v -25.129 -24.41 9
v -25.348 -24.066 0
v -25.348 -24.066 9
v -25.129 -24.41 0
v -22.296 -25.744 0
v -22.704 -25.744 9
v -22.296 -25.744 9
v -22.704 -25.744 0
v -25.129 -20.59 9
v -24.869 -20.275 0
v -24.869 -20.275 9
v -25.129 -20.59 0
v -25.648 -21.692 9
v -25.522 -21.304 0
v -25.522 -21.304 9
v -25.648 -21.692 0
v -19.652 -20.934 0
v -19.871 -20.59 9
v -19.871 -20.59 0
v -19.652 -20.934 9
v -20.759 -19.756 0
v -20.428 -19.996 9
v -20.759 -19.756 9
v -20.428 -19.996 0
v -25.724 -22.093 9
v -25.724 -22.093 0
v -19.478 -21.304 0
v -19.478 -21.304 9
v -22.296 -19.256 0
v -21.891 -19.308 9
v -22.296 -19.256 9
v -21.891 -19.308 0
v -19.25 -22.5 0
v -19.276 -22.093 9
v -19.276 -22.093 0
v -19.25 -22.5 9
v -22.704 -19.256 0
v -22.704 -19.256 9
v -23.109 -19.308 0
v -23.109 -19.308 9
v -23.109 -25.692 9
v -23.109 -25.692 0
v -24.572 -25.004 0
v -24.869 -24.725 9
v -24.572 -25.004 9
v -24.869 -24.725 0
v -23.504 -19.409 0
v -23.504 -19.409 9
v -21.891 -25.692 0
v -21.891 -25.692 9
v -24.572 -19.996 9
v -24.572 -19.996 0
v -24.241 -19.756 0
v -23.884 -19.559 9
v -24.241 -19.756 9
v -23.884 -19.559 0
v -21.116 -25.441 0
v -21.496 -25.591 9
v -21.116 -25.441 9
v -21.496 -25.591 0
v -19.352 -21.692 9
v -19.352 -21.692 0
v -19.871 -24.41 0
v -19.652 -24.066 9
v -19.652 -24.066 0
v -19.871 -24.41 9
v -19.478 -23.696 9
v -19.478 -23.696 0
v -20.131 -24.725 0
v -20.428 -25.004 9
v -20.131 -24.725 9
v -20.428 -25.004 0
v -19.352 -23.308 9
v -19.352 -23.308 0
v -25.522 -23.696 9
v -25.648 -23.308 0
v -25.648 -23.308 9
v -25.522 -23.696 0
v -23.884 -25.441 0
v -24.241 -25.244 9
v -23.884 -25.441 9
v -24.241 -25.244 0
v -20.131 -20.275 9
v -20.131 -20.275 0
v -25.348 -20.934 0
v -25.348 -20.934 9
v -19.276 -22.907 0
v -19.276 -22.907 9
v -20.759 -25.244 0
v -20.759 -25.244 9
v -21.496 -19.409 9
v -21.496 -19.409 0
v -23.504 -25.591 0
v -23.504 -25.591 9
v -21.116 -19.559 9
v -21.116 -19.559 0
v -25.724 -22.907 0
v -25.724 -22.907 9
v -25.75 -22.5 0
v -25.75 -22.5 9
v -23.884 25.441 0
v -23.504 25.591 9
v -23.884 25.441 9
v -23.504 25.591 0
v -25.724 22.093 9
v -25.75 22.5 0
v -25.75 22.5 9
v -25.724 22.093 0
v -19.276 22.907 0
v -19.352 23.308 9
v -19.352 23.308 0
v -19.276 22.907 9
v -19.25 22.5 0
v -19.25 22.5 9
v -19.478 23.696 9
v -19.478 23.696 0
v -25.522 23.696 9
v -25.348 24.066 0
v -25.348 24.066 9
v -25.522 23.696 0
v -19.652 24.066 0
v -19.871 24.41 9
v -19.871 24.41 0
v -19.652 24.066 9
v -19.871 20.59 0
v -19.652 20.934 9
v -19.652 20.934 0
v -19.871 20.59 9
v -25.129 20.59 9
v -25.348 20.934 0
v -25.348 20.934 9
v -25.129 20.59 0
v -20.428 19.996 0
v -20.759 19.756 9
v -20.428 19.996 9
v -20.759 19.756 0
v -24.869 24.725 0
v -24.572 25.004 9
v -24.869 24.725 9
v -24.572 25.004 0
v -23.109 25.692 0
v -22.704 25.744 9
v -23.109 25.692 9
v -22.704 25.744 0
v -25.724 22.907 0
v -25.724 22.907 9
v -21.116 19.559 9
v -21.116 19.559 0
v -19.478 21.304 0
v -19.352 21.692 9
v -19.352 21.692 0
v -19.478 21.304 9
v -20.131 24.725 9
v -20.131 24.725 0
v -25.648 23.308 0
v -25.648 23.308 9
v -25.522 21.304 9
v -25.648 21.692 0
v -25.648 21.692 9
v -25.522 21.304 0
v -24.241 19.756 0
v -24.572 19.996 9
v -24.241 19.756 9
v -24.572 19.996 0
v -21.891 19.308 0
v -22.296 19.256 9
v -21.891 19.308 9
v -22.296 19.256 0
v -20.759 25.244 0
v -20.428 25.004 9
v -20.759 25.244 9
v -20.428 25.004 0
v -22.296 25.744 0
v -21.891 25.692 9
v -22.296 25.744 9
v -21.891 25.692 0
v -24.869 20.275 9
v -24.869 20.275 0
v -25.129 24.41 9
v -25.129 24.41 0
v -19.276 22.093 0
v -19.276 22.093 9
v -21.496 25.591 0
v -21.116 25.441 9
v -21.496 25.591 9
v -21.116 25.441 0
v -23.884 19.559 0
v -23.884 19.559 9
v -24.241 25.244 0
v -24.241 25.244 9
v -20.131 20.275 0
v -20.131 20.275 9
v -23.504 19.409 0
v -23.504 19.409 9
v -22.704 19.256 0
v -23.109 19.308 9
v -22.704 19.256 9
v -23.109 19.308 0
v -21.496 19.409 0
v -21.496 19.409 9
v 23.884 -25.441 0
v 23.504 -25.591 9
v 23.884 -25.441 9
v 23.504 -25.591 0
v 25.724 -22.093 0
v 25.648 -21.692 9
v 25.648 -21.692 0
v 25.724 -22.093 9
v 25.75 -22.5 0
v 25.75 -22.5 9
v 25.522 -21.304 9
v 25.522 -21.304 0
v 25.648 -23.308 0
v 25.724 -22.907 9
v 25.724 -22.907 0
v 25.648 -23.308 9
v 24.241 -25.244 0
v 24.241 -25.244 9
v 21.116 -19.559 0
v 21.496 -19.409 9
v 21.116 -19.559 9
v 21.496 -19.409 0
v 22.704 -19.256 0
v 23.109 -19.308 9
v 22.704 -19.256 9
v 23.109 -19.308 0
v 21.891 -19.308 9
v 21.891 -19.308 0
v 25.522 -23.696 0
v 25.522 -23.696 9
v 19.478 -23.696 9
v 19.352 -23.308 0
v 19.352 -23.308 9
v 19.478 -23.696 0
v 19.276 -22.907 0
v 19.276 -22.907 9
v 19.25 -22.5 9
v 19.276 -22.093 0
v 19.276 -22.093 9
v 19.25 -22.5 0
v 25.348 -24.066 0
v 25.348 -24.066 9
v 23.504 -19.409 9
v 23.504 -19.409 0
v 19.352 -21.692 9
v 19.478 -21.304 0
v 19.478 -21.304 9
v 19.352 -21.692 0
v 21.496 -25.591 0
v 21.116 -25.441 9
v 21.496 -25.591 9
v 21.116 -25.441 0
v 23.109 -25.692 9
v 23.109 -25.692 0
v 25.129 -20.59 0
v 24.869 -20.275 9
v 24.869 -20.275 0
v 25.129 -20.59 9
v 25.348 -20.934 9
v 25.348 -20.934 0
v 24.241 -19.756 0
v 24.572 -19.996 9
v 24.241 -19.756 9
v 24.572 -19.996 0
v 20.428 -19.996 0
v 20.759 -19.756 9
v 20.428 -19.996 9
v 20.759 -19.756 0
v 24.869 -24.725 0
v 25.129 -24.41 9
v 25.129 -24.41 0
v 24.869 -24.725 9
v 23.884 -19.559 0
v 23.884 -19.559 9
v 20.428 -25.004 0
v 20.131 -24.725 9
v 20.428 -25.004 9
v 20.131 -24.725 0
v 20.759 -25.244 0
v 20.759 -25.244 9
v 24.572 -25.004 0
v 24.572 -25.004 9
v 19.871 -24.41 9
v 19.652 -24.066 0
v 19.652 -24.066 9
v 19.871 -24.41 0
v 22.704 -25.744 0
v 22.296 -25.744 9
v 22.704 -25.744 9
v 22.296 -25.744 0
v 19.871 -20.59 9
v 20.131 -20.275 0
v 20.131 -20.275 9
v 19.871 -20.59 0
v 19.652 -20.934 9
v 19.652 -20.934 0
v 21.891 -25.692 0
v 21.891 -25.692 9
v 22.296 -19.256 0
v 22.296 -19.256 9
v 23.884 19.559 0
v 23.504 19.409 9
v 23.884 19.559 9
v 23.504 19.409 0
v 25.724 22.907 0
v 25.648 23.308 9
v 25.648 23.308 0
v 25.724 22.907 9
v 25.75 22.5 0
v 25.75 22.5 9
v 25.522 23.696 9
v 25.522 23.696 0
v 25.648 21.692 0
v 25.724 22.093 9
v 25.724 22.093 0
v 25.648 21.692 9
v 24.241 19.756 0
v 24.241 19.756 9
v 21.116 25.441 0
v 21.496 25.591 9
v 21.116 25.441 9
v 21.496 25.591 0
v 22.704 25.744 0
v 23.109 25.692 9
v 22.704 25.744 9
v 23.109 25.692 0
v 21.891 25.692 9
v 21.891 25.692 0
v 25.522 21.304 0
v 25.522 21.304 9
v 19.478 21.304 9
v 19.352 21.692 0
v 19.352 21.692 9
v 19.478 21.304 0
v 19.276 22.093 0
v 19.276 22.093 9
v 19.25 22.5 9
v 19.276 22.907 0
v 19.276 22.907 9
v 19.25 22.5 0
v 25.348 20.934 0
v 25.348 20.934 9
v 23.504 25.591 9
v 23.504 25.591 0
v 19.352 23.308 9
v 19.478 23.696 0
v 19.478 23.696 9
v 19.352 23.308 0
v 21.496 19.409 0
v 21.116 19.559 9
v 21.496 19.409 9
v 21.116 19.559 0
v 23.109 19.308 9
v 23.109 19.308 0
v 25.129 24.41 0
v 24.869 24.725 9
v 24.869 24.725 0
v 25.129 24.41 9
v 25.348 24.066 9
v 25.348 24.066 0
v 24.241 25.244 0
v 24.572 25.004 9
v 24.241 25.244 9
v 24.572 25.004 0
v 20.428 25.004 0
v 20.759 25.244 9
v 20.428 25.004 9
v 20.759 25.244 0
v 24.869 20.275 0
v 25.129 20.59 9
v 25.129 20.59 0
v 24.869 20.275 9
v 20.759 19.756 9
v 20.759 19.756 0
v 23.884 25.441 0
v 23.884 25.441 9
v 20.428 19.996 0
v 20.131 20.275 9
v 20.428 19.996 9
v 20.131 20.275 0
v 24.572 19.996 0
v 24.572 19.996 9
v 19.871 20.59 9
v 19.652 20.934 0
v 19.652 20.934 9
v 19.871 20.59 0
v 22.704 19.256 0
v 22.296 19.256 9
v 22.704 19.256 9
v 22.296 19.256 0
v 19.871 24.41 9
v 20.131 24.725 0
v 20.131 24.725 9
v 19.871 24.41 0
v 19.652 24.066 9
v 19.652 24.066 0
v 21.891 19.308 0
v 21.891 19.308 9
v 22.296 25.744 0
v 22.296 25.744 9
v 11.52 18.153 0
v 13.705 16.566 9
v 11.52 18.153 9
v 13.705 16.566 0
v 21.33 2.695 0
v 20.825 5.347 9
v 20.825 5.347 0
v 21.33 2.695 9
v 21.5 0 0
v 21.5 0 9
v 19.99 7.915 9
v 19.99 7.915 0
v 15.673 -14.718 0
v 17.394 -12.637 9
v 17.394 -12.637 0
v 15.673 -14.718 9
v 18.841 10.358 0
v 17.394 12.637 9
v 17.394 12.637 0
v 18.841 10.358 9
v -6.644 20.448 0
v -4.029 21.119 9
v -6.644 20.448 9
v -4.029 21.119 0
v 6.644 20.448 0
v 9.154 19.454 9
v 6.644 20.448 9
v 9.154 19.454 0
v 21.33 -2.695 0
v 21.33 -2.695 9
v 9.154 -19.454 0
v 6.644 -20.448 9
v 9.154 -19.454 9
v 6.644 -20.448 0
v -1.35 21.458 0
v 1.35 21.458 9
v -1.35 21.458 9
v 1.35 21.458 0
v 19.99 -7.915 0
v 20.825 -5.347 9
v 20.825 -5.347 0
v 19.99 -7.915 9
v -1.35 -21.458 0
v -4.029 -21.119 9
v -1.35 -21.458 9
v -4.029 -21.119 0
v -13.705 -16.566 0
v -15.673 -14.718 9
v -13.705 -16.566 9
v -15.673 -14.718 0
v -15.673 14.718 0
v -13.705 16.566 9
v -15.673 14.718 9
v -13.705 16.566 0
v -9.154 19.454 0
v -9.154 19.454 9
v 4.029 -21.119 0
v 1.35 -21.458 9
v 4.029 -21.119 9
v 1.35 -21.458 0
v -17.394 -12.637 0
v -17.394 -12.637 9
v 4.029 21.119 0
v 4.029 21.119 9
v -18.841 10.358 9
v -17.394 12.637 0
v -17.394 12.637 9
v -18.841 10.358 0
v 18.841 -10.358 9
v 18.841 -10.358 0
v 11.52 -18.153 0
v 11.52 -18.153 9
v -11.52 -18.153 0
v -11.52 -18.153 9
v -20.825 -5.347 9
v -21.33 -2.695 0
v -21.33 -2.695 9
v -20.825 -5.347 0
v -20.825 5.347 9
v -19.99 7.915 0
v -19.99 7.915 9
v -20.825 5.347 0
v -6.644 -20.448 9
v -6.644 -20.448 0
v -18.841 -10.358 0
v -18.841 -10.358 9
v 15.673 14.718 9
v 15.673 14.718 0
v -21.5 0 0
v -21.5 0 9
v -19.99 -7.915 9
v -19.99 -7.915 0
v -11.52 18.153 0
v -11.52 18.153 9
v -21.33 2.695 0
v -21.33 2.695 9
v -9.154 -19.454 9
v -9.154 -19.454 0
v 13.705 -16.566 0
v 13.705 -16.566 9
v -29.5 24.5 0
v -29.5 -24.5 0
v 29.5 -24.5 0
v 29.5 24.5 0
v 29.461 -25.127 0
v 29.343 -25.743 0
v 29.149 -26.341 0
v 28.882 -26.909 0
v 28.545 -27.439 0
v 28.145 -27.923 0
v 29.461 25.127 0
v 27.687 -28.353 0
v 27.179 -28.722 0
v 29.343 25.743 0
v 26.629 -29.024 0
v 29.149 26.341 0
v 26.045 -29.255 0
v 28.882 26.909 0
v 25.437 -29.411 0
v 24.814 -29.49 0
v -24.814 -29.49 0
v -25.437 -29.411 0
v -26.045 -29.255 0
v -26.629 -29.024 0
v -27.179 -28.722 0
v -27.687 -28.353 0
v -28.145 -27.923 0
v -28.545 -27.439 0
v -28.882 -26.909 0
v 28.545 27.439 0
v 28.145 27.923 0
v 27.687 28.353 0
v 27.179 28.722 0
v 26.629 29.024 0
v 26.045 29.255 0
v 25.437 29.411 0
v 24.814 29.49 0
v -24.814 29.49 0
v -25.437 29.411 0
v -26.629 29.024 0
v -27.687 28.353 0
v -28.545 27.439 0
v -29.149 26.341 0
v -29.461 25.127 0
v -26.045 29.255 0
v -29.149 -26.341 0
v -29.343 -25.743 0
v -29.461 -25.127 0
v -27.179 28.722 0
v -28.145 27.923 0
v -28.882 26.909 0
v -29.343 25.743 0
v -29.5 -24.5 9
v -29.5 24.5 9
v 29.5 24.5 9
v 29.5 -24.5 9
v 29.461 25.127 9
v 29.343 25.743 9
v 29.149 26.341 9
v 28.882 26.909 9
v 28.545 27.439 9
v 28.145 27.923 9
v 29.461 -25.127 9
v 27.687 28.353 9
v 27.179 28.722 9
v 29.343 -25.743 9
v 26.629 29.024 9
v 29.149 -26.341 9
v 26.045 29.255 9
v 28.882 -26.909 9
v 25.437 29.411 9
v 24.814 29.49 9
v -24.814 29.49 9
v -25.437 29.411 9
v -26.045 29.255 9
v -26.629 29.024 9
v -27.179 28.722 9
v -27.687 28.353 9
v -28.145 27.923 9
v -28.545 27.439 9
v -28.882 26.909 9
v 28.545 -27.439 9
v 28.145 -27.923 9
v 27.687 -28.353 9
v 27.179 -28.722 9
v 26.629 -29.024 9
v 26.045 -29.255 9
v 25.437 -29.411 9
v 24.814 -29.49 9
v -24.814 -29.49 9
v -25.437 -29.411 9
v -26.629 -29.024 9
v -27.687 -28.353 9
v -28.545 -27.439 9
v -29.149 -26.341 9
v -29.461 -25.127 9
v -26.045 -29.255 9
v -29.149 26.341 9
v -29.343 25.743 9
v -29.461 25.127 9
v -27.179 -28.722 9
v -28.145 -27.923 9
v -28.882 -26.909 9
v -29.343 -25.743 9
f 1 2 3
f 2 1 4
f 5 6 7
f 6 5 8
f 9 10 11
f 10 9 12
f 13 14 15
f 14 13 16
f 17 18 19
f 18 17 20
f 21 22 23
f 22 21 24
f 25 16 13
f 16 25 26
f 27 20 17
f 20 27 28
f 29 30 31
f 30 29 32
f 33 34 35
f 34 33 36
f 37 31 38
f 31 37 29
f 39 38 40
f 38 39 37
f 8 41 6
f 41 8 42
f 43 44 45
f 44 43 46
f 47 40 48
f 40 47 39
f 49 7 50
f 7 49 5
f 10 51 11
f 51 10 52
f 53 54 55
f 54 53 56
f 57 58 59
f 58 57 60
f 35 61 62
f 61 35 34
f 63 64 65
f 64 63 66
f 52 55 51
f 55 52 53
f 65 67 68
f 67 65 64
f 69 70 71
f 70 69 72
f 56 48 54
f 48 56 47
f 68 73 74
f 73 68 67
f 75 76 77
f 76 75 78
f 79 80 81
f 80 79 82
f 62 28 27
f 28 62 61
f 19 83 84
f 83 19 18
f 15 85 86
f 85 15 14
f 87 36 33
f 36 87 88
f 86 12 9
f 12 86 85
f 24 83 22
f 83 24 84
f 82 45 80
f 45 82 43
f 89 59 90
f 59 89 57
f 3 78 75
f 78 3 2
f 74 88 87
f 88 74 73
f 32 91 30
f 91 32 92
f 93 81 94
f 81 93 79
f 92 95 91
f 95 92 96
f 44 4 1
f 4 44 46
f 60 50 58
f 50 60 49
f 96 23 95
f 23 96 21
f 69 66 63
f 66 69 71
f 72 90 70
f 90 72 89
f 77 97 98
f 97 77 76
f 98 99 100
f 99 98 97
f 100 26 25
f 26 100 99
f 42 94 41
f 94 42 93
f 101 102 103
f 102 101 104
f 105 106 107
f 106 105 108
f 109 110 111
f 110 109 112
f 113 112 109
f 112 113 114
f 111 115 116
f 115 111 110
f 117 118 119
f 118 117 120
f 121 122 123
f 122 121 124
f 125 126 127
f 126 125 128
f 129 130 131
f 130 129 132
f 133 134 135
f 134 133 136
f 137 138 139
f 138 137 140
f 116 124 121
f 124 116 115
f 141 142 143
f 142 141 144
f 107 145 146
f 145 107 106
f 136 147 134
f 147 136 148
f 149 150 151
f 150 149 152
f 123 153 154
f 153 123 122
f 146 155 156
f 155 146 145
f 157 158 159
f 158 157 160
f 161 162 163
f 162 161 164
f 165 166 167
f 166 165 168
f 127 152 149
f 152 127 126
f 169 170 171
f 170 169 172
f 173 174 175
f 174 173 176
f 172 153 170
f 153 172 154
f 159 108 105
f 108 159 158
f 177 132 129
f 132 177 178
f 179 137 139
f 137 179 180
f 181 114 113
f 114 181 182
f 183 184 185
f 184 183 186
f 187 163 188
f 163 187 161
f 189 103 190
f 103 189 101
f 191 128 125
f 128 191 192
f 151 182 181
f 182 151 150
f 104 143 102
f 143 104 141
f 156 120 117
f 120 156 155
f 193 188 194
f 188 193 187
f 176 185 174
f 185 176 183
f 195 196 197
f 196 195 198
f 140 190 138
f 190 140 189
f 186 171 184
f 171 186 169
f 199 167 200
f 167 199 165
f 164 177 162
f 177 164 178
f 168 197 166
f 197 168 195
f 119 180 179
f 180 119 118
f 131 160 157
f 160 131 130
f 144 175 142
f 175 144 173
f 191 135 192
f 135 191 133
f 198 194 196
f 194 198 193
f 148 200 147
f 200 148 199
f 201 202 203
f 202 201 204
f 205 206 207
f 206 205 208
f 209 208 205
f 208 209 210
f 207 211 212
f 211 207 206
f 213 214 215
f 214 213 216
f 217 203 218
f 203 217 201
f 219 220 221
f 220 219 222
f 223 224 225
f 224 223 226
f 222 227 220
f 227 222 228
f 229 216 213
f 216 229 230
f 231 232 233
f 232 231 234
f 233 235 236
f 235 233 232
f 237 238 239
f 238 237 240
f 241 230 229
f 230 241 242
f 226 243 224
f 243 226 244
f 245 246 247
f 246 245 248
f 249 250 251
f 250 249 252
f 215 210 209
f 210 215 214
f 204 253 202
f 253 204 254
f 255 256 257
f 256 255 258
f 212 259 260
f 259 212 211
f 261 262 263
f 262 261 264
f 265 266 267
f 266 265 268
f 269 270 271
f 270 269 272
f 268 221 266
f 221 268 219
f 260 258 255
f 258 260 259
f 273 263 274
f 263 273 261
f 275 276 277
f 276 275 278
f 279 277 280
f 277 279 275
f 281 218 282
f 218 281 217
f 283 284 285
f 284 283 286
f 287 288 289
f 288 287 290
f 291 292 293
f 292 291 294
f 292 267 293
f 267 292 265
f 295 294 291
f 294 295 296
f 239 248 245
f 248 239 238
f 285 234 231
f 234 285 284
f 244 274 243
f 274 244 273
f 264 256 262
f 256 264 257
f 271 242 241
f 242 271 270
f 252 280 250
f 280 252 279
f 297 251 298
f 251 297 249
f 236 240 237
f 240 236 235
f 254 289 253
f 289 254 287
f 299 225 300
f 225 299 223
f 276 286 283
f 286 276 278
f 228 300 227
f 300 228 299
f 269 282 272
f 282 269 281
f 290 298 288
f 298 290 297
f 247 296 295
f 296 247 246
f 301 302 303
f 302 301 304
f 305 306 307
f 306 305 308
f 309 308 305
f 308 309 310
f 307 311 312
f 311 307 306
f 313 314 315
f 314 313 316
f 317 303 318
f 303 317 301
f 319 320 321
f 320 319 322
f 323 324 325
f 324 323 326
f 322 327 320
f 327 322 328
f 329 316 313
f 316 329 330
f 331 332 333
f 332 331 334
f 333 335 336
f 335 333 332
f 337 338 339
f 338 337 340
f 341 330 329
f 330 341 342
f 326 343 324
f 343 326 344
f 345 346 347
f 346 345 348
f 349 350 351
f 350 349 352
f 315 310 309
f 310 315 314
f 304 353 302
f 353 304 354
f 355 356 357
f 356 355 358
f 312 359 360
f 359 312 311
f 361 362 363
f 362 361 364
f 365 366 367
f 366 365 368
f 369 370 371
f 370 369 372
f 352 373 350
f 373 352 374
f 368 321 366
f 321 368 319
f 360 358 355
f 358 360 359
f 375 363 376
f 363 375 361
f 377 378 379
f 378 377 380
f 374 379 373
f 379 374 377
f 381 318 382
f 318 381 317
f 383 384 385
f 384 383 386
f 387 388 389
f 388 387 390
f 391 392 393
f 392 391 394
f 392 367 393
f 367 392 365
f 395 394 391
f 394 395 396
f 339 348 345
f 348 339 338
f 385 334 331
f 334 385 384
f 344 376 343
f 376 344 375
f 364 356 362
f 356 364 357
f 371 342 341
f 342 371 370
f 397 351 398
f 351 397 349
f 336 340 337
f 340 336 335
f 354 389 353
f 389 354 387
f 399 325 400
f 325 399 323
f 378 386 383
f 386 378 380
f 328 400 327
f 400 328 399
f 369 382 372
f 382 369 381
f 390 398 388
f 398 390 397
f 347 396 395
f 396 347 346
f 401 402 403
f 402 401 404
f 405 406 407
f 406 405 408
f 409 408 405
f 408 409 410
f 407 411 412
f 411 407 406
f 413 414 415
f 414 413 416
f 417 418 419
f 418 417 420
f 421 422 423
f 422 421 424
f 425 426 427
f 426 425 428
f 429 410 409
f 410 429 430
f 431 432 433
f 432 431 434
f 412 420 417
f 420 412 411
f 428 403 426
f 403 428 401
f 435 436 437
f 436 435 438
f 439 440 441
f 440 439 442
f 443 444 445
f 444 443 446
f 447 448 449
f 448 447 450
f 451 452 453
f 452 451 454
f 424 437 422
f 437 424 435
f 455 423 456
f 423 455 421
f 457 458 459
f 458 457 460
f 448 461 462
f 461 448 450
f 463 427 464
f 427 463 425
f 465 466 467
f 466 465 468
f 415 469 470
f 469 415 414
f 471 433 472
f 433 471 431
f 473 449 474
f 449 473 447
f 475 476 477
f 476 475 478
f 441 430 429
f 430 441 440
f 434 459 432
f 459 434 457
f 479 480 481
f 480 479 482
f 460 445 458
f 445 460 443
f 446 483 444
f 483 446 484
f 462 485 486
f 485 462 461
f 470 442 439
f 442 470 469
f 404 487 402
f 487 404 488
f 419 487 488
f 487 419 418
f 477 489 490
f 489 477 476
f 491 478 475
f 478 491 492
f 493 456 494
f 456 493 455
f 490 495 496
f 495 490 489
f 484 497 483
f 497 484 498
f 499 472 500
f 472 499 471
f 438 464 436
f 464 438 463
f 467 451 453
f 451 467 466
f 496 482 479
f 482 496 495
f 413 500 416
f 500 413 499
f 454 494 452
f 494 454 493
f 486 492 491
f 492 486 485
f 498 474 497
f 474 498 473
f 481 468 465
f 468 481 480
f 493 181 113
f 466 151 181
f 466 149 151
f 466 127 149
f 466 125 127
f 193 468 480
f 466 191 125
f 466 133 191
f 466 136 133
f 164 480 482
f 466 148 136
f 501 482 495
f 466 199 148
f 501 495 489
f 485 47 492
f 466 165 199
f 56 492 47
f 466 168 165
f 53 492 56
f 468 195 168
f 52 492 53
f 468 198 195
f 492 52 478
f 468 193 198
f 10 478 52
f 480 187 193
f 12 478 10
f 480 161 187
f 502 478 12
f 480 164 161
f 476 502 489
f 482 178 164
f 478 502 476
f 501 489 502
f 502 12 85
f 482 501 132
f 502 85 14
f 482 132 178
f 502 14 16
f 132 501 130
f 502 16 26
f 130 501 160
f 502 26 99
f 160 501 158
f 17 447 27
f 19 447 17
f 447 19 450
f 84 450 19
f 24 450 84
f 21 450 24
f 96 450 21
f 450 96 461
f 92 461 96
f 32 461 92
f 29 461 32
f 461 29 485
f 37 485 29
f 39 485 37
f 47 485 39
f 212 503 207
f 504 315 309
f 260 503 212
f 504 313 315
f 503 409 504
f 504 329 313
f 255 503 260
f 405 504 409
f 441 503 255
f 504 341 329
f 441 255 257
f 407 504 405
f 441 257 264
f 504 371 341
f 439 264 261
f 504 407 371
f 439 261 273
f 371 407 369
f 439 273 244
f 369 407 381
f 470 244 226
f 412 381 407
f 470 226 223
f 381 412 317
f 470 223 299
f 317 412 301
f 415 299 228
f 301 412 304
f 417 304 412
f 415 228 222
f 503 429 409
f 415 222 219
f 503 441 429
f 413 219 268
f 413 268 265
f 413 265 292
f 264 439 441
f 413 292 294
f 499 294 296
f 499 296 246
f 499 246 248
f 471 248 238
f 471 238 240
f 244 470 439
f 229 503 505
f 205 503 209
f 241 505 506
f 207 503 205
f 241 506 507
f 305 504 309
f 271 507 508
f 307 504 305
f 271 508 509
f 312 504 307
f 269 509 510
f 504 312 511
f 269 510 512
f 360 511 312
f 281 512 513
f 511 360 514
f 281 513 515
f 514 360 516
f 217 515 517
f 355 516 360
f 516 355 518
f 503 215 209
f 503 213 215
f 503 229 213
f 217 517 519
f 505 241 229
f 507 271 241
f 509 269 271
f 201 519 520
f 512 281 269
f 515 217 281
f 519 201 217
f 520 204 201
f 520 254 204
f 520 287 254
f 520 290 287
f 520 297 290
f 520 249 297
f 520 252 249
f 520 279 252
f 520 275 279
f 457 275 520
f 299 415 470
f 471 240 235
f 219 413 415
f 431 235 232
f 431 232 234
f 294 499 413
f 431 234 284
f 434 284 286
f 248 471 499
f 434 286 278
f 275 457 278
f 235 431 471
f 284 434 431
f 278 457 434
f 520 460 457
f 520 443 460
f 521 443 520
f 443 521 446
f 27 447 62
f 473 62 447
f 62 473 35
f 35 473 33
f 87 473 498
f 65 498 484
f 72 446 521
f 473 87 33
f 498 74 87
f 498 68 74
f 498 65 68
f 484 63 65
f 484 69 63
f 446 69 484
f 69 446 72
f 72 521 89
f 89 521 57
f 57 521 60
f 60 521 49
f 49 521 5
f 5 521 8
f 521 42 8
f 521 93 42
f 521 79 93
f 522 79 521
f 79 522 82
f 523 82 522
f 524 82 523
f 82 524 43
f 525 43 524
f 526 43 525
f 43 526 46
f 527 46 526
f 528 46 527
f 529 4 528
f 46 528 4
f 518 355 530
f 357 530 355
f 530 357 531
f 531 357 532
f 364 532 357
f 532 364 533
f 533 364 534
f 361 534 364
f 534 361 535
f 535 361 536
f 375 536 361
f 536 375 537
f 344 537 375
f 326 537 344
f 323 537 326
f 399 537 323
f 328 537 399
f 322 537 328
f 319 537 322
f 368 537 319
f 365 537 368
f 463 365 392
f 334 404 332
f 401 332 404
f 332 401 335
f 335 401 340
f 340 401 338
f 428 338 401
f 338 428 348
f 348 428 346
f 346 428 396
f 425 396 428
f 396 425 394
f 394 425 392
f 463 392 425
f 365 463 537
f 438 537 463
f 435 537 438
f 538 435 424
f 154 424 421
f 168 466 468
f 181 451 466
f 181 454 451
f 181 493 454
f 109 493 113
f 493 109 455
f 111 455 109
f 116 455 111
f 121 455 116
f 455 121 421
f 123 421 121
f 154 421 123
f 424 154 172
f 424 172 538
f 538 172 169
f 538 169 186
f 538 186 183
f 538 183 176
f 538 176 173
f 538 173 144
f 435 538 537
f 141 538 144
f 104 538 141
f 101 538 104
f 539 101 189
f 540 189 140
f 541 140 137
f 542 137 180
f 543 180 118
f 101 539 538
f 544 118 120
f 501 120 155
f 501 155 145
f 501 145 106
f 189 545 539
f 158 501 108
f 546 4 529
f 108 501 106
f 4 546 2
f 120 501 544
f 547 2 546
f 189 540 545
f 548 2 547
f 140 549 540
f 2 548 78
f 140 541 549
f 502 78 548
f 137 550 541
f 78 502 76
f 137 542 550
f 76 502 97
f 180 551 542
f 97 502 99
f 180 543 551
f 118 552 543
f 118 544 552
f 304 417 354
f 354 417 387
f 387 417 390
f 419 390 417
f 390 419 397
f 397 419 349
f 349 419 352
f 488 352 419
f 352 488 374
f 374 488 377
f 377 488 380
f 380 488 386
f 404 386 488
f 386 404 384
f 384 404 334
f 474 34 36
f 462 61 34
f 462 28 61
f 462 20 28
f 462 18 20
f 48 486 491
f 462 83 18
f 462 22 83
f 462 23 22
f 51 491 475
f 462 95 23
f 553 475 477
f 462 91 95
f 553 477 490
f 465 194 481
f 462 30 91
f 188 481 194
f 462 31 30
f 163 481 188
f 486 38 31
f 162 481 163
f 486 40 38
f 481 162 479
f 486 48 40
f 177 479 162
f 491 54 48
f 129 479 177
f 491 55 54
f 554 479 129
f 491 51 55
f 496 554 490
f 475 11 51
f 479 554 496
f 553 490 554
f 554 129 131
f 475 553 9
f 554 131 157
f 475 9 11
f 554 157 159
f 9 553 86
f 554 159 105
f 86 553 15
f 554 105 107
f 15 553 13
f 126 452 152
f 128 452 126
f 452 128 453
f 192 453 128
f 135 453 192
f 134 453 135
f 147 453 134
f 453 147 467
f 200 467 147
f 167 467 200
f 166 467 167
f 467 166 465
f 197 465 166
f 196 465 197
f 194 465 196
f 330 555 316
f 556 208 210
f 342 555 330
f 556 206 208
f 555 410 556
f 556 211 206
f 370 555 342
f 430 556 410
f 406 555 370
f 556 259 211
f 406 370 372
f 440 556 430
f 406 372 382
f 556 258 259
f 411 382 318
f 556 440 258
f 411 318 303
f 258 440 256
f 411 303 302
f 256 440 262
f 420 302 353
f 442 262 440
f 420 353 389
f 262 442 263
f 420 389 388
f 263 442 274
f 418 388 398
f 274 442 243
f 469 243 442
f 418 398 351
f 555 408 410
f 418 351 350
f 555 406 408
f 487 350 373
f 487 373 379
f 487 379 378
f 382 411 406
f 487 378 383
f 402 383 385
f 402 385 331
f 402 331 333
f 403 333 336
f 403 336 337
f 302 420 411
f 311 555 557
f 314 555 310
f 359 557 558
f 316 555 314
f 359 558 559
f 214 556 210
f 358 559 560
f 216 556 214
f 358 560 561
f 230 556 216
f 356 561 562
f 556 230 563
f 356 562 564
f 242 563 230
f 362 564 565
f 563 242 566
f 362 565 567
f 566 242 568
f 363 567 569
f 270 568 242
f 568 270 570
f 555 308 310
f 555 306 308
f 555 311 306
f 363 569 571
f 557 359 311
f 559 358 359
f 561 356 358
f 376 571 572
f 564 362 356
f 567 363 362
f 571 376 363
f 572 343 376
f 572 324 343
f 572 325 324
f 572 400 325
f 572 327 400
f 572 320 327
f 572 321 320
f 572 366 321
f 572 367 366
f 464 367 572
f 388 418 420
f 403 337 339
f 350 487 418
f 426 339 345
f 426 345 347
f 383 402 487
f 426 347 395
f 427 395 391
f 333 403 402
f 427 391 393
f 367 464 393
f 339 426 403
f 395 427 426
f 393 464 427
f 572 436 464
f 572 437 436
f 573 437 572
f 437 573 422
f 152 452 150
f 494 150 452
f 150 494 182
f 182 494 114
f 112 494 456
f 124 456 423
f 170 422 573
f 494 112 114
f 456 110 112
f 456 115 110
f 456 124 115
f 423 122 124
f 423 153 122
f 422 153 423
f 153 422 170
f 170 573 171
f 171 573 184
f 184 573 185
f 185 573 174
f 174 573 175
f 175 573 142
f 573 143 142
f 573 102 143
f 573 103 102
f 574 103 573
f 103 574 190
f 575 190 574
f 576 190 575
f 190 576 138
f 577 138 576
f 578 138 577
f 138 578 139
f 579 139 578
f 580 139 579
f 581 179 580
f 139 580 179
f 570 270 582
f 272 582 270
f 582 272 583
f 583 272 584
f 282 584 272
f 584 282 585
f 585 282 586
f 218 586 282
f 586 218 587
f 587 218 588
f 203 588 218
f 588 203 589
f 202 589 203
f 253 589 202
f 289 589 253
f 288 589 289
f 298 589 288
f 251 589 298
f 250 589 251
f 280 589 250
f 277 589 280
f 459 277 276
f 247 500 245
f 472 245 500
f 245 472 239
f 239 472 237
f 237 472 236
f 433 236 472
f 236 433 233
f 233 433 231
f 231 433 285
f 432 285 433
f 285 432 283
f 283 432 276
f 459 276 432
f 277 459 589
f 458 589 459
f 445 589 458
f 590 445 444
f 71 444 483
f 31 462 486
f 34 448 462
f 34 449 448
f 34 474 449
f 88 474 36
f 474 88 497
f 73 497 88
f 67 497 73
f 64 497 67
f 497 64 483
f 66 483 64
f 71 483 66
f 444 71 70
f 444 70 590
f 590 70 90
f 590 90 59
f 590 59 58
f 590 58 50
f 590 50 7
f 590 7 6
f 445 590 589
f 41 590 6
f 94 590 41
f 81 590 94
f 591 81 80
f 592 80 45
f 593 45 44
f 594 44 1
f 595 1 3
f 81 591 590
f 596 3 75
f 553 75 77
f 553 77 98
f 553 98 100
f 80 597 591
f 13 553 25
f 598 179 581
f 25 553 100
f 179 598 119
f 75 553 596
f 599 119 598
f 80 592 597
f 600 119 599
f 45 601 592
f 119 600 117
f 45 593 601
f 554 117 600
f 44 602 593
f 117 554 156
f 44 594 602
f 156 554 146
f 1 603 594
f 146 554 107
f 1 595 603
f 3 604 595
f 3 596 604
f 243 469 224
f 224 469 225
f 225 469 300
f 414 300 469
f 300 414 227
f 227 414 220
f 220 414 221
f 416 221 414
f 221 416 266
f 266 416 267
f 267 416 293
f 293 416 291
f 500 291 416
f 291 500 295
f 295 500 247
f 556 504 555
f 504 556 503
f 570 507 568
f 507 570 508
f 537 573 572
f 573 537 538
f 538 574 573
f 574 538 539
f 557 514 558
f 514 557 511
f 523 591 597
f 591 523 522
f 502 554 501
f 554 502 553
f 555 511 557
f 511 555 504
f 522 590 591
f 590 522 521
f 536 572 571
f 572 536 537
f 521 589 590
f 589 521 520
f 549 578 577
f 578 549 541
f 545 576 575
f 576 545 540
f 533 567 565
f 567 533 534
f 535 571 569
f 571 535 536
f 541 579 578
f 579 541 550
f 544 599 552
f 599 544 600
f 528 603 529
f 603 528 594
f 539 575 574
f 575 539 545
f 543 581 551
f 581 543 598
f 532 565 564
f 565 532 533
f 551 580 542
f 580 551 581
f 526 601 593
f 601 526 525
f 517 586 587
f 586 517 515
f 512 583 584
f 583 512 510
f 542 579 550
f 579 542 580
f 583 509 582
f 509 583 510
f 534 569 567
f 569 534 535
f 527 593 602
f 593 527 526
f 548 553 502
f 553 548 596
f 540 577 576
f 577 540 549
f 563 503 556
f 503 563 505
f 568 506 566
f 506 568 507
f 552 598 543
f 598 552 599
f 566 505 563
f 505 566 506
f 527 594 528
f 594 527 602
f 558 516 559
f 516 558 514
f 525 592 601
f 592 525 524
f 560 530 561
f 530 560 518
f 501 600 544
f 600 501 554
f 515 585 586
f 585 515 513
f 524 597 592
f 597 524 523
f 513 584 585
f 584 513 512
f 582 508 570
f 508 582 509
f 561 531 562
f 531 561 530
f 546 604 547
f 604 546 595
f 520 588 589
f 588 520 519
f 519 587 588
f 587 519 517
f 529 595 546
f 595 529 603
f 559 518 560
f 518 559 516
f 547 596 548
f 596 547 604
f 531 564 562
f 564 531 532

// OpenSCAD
$fn = 50;


difference() {
	union() {
		hull() {
			translate(v = [-24.5000000000, 24.5000000000, 0]) {
				cylinder(h = 9, r = 5);
			}
			translate(v = [24.5000000000, 24.5000000000, 0]) {
				cylinder(h = 9, r = 5);
			}
			translate(v = [-24.5000000000, -24.5000000000, 0]) {
				cylinder(h = 9, r = 5);
			}
			translate(v = [24.5000000000, -24.5000000000, 0]) {
				cylinder(h = 9, r = 5);
			}
		}
	}
	union() {
		#translate(v = [-22.5000000000, -22.5000000000, -100.0000000000]) {
			cylinder(h = 200, r = 3.2500000000);
		}
		#translate(v = [-22.5000000000, 22.5000000000, -100.0000000000]) {
			cylinder(h = 200, r = 3.2500000000);
		}
		#translate(v = [22.5000000000, -22.5000000000, -100.0000000000]) {
			cylinder(h = 200, r = 3.2500000000);
		}
		#translate(v = [22.5000000000, 22.5000000000, -100.0000000000]) {
			cylinder(h = 200, r = 3.2500000000);
		}
		#cylinder(h = 9, r = 21.5000000000);
	}
}
